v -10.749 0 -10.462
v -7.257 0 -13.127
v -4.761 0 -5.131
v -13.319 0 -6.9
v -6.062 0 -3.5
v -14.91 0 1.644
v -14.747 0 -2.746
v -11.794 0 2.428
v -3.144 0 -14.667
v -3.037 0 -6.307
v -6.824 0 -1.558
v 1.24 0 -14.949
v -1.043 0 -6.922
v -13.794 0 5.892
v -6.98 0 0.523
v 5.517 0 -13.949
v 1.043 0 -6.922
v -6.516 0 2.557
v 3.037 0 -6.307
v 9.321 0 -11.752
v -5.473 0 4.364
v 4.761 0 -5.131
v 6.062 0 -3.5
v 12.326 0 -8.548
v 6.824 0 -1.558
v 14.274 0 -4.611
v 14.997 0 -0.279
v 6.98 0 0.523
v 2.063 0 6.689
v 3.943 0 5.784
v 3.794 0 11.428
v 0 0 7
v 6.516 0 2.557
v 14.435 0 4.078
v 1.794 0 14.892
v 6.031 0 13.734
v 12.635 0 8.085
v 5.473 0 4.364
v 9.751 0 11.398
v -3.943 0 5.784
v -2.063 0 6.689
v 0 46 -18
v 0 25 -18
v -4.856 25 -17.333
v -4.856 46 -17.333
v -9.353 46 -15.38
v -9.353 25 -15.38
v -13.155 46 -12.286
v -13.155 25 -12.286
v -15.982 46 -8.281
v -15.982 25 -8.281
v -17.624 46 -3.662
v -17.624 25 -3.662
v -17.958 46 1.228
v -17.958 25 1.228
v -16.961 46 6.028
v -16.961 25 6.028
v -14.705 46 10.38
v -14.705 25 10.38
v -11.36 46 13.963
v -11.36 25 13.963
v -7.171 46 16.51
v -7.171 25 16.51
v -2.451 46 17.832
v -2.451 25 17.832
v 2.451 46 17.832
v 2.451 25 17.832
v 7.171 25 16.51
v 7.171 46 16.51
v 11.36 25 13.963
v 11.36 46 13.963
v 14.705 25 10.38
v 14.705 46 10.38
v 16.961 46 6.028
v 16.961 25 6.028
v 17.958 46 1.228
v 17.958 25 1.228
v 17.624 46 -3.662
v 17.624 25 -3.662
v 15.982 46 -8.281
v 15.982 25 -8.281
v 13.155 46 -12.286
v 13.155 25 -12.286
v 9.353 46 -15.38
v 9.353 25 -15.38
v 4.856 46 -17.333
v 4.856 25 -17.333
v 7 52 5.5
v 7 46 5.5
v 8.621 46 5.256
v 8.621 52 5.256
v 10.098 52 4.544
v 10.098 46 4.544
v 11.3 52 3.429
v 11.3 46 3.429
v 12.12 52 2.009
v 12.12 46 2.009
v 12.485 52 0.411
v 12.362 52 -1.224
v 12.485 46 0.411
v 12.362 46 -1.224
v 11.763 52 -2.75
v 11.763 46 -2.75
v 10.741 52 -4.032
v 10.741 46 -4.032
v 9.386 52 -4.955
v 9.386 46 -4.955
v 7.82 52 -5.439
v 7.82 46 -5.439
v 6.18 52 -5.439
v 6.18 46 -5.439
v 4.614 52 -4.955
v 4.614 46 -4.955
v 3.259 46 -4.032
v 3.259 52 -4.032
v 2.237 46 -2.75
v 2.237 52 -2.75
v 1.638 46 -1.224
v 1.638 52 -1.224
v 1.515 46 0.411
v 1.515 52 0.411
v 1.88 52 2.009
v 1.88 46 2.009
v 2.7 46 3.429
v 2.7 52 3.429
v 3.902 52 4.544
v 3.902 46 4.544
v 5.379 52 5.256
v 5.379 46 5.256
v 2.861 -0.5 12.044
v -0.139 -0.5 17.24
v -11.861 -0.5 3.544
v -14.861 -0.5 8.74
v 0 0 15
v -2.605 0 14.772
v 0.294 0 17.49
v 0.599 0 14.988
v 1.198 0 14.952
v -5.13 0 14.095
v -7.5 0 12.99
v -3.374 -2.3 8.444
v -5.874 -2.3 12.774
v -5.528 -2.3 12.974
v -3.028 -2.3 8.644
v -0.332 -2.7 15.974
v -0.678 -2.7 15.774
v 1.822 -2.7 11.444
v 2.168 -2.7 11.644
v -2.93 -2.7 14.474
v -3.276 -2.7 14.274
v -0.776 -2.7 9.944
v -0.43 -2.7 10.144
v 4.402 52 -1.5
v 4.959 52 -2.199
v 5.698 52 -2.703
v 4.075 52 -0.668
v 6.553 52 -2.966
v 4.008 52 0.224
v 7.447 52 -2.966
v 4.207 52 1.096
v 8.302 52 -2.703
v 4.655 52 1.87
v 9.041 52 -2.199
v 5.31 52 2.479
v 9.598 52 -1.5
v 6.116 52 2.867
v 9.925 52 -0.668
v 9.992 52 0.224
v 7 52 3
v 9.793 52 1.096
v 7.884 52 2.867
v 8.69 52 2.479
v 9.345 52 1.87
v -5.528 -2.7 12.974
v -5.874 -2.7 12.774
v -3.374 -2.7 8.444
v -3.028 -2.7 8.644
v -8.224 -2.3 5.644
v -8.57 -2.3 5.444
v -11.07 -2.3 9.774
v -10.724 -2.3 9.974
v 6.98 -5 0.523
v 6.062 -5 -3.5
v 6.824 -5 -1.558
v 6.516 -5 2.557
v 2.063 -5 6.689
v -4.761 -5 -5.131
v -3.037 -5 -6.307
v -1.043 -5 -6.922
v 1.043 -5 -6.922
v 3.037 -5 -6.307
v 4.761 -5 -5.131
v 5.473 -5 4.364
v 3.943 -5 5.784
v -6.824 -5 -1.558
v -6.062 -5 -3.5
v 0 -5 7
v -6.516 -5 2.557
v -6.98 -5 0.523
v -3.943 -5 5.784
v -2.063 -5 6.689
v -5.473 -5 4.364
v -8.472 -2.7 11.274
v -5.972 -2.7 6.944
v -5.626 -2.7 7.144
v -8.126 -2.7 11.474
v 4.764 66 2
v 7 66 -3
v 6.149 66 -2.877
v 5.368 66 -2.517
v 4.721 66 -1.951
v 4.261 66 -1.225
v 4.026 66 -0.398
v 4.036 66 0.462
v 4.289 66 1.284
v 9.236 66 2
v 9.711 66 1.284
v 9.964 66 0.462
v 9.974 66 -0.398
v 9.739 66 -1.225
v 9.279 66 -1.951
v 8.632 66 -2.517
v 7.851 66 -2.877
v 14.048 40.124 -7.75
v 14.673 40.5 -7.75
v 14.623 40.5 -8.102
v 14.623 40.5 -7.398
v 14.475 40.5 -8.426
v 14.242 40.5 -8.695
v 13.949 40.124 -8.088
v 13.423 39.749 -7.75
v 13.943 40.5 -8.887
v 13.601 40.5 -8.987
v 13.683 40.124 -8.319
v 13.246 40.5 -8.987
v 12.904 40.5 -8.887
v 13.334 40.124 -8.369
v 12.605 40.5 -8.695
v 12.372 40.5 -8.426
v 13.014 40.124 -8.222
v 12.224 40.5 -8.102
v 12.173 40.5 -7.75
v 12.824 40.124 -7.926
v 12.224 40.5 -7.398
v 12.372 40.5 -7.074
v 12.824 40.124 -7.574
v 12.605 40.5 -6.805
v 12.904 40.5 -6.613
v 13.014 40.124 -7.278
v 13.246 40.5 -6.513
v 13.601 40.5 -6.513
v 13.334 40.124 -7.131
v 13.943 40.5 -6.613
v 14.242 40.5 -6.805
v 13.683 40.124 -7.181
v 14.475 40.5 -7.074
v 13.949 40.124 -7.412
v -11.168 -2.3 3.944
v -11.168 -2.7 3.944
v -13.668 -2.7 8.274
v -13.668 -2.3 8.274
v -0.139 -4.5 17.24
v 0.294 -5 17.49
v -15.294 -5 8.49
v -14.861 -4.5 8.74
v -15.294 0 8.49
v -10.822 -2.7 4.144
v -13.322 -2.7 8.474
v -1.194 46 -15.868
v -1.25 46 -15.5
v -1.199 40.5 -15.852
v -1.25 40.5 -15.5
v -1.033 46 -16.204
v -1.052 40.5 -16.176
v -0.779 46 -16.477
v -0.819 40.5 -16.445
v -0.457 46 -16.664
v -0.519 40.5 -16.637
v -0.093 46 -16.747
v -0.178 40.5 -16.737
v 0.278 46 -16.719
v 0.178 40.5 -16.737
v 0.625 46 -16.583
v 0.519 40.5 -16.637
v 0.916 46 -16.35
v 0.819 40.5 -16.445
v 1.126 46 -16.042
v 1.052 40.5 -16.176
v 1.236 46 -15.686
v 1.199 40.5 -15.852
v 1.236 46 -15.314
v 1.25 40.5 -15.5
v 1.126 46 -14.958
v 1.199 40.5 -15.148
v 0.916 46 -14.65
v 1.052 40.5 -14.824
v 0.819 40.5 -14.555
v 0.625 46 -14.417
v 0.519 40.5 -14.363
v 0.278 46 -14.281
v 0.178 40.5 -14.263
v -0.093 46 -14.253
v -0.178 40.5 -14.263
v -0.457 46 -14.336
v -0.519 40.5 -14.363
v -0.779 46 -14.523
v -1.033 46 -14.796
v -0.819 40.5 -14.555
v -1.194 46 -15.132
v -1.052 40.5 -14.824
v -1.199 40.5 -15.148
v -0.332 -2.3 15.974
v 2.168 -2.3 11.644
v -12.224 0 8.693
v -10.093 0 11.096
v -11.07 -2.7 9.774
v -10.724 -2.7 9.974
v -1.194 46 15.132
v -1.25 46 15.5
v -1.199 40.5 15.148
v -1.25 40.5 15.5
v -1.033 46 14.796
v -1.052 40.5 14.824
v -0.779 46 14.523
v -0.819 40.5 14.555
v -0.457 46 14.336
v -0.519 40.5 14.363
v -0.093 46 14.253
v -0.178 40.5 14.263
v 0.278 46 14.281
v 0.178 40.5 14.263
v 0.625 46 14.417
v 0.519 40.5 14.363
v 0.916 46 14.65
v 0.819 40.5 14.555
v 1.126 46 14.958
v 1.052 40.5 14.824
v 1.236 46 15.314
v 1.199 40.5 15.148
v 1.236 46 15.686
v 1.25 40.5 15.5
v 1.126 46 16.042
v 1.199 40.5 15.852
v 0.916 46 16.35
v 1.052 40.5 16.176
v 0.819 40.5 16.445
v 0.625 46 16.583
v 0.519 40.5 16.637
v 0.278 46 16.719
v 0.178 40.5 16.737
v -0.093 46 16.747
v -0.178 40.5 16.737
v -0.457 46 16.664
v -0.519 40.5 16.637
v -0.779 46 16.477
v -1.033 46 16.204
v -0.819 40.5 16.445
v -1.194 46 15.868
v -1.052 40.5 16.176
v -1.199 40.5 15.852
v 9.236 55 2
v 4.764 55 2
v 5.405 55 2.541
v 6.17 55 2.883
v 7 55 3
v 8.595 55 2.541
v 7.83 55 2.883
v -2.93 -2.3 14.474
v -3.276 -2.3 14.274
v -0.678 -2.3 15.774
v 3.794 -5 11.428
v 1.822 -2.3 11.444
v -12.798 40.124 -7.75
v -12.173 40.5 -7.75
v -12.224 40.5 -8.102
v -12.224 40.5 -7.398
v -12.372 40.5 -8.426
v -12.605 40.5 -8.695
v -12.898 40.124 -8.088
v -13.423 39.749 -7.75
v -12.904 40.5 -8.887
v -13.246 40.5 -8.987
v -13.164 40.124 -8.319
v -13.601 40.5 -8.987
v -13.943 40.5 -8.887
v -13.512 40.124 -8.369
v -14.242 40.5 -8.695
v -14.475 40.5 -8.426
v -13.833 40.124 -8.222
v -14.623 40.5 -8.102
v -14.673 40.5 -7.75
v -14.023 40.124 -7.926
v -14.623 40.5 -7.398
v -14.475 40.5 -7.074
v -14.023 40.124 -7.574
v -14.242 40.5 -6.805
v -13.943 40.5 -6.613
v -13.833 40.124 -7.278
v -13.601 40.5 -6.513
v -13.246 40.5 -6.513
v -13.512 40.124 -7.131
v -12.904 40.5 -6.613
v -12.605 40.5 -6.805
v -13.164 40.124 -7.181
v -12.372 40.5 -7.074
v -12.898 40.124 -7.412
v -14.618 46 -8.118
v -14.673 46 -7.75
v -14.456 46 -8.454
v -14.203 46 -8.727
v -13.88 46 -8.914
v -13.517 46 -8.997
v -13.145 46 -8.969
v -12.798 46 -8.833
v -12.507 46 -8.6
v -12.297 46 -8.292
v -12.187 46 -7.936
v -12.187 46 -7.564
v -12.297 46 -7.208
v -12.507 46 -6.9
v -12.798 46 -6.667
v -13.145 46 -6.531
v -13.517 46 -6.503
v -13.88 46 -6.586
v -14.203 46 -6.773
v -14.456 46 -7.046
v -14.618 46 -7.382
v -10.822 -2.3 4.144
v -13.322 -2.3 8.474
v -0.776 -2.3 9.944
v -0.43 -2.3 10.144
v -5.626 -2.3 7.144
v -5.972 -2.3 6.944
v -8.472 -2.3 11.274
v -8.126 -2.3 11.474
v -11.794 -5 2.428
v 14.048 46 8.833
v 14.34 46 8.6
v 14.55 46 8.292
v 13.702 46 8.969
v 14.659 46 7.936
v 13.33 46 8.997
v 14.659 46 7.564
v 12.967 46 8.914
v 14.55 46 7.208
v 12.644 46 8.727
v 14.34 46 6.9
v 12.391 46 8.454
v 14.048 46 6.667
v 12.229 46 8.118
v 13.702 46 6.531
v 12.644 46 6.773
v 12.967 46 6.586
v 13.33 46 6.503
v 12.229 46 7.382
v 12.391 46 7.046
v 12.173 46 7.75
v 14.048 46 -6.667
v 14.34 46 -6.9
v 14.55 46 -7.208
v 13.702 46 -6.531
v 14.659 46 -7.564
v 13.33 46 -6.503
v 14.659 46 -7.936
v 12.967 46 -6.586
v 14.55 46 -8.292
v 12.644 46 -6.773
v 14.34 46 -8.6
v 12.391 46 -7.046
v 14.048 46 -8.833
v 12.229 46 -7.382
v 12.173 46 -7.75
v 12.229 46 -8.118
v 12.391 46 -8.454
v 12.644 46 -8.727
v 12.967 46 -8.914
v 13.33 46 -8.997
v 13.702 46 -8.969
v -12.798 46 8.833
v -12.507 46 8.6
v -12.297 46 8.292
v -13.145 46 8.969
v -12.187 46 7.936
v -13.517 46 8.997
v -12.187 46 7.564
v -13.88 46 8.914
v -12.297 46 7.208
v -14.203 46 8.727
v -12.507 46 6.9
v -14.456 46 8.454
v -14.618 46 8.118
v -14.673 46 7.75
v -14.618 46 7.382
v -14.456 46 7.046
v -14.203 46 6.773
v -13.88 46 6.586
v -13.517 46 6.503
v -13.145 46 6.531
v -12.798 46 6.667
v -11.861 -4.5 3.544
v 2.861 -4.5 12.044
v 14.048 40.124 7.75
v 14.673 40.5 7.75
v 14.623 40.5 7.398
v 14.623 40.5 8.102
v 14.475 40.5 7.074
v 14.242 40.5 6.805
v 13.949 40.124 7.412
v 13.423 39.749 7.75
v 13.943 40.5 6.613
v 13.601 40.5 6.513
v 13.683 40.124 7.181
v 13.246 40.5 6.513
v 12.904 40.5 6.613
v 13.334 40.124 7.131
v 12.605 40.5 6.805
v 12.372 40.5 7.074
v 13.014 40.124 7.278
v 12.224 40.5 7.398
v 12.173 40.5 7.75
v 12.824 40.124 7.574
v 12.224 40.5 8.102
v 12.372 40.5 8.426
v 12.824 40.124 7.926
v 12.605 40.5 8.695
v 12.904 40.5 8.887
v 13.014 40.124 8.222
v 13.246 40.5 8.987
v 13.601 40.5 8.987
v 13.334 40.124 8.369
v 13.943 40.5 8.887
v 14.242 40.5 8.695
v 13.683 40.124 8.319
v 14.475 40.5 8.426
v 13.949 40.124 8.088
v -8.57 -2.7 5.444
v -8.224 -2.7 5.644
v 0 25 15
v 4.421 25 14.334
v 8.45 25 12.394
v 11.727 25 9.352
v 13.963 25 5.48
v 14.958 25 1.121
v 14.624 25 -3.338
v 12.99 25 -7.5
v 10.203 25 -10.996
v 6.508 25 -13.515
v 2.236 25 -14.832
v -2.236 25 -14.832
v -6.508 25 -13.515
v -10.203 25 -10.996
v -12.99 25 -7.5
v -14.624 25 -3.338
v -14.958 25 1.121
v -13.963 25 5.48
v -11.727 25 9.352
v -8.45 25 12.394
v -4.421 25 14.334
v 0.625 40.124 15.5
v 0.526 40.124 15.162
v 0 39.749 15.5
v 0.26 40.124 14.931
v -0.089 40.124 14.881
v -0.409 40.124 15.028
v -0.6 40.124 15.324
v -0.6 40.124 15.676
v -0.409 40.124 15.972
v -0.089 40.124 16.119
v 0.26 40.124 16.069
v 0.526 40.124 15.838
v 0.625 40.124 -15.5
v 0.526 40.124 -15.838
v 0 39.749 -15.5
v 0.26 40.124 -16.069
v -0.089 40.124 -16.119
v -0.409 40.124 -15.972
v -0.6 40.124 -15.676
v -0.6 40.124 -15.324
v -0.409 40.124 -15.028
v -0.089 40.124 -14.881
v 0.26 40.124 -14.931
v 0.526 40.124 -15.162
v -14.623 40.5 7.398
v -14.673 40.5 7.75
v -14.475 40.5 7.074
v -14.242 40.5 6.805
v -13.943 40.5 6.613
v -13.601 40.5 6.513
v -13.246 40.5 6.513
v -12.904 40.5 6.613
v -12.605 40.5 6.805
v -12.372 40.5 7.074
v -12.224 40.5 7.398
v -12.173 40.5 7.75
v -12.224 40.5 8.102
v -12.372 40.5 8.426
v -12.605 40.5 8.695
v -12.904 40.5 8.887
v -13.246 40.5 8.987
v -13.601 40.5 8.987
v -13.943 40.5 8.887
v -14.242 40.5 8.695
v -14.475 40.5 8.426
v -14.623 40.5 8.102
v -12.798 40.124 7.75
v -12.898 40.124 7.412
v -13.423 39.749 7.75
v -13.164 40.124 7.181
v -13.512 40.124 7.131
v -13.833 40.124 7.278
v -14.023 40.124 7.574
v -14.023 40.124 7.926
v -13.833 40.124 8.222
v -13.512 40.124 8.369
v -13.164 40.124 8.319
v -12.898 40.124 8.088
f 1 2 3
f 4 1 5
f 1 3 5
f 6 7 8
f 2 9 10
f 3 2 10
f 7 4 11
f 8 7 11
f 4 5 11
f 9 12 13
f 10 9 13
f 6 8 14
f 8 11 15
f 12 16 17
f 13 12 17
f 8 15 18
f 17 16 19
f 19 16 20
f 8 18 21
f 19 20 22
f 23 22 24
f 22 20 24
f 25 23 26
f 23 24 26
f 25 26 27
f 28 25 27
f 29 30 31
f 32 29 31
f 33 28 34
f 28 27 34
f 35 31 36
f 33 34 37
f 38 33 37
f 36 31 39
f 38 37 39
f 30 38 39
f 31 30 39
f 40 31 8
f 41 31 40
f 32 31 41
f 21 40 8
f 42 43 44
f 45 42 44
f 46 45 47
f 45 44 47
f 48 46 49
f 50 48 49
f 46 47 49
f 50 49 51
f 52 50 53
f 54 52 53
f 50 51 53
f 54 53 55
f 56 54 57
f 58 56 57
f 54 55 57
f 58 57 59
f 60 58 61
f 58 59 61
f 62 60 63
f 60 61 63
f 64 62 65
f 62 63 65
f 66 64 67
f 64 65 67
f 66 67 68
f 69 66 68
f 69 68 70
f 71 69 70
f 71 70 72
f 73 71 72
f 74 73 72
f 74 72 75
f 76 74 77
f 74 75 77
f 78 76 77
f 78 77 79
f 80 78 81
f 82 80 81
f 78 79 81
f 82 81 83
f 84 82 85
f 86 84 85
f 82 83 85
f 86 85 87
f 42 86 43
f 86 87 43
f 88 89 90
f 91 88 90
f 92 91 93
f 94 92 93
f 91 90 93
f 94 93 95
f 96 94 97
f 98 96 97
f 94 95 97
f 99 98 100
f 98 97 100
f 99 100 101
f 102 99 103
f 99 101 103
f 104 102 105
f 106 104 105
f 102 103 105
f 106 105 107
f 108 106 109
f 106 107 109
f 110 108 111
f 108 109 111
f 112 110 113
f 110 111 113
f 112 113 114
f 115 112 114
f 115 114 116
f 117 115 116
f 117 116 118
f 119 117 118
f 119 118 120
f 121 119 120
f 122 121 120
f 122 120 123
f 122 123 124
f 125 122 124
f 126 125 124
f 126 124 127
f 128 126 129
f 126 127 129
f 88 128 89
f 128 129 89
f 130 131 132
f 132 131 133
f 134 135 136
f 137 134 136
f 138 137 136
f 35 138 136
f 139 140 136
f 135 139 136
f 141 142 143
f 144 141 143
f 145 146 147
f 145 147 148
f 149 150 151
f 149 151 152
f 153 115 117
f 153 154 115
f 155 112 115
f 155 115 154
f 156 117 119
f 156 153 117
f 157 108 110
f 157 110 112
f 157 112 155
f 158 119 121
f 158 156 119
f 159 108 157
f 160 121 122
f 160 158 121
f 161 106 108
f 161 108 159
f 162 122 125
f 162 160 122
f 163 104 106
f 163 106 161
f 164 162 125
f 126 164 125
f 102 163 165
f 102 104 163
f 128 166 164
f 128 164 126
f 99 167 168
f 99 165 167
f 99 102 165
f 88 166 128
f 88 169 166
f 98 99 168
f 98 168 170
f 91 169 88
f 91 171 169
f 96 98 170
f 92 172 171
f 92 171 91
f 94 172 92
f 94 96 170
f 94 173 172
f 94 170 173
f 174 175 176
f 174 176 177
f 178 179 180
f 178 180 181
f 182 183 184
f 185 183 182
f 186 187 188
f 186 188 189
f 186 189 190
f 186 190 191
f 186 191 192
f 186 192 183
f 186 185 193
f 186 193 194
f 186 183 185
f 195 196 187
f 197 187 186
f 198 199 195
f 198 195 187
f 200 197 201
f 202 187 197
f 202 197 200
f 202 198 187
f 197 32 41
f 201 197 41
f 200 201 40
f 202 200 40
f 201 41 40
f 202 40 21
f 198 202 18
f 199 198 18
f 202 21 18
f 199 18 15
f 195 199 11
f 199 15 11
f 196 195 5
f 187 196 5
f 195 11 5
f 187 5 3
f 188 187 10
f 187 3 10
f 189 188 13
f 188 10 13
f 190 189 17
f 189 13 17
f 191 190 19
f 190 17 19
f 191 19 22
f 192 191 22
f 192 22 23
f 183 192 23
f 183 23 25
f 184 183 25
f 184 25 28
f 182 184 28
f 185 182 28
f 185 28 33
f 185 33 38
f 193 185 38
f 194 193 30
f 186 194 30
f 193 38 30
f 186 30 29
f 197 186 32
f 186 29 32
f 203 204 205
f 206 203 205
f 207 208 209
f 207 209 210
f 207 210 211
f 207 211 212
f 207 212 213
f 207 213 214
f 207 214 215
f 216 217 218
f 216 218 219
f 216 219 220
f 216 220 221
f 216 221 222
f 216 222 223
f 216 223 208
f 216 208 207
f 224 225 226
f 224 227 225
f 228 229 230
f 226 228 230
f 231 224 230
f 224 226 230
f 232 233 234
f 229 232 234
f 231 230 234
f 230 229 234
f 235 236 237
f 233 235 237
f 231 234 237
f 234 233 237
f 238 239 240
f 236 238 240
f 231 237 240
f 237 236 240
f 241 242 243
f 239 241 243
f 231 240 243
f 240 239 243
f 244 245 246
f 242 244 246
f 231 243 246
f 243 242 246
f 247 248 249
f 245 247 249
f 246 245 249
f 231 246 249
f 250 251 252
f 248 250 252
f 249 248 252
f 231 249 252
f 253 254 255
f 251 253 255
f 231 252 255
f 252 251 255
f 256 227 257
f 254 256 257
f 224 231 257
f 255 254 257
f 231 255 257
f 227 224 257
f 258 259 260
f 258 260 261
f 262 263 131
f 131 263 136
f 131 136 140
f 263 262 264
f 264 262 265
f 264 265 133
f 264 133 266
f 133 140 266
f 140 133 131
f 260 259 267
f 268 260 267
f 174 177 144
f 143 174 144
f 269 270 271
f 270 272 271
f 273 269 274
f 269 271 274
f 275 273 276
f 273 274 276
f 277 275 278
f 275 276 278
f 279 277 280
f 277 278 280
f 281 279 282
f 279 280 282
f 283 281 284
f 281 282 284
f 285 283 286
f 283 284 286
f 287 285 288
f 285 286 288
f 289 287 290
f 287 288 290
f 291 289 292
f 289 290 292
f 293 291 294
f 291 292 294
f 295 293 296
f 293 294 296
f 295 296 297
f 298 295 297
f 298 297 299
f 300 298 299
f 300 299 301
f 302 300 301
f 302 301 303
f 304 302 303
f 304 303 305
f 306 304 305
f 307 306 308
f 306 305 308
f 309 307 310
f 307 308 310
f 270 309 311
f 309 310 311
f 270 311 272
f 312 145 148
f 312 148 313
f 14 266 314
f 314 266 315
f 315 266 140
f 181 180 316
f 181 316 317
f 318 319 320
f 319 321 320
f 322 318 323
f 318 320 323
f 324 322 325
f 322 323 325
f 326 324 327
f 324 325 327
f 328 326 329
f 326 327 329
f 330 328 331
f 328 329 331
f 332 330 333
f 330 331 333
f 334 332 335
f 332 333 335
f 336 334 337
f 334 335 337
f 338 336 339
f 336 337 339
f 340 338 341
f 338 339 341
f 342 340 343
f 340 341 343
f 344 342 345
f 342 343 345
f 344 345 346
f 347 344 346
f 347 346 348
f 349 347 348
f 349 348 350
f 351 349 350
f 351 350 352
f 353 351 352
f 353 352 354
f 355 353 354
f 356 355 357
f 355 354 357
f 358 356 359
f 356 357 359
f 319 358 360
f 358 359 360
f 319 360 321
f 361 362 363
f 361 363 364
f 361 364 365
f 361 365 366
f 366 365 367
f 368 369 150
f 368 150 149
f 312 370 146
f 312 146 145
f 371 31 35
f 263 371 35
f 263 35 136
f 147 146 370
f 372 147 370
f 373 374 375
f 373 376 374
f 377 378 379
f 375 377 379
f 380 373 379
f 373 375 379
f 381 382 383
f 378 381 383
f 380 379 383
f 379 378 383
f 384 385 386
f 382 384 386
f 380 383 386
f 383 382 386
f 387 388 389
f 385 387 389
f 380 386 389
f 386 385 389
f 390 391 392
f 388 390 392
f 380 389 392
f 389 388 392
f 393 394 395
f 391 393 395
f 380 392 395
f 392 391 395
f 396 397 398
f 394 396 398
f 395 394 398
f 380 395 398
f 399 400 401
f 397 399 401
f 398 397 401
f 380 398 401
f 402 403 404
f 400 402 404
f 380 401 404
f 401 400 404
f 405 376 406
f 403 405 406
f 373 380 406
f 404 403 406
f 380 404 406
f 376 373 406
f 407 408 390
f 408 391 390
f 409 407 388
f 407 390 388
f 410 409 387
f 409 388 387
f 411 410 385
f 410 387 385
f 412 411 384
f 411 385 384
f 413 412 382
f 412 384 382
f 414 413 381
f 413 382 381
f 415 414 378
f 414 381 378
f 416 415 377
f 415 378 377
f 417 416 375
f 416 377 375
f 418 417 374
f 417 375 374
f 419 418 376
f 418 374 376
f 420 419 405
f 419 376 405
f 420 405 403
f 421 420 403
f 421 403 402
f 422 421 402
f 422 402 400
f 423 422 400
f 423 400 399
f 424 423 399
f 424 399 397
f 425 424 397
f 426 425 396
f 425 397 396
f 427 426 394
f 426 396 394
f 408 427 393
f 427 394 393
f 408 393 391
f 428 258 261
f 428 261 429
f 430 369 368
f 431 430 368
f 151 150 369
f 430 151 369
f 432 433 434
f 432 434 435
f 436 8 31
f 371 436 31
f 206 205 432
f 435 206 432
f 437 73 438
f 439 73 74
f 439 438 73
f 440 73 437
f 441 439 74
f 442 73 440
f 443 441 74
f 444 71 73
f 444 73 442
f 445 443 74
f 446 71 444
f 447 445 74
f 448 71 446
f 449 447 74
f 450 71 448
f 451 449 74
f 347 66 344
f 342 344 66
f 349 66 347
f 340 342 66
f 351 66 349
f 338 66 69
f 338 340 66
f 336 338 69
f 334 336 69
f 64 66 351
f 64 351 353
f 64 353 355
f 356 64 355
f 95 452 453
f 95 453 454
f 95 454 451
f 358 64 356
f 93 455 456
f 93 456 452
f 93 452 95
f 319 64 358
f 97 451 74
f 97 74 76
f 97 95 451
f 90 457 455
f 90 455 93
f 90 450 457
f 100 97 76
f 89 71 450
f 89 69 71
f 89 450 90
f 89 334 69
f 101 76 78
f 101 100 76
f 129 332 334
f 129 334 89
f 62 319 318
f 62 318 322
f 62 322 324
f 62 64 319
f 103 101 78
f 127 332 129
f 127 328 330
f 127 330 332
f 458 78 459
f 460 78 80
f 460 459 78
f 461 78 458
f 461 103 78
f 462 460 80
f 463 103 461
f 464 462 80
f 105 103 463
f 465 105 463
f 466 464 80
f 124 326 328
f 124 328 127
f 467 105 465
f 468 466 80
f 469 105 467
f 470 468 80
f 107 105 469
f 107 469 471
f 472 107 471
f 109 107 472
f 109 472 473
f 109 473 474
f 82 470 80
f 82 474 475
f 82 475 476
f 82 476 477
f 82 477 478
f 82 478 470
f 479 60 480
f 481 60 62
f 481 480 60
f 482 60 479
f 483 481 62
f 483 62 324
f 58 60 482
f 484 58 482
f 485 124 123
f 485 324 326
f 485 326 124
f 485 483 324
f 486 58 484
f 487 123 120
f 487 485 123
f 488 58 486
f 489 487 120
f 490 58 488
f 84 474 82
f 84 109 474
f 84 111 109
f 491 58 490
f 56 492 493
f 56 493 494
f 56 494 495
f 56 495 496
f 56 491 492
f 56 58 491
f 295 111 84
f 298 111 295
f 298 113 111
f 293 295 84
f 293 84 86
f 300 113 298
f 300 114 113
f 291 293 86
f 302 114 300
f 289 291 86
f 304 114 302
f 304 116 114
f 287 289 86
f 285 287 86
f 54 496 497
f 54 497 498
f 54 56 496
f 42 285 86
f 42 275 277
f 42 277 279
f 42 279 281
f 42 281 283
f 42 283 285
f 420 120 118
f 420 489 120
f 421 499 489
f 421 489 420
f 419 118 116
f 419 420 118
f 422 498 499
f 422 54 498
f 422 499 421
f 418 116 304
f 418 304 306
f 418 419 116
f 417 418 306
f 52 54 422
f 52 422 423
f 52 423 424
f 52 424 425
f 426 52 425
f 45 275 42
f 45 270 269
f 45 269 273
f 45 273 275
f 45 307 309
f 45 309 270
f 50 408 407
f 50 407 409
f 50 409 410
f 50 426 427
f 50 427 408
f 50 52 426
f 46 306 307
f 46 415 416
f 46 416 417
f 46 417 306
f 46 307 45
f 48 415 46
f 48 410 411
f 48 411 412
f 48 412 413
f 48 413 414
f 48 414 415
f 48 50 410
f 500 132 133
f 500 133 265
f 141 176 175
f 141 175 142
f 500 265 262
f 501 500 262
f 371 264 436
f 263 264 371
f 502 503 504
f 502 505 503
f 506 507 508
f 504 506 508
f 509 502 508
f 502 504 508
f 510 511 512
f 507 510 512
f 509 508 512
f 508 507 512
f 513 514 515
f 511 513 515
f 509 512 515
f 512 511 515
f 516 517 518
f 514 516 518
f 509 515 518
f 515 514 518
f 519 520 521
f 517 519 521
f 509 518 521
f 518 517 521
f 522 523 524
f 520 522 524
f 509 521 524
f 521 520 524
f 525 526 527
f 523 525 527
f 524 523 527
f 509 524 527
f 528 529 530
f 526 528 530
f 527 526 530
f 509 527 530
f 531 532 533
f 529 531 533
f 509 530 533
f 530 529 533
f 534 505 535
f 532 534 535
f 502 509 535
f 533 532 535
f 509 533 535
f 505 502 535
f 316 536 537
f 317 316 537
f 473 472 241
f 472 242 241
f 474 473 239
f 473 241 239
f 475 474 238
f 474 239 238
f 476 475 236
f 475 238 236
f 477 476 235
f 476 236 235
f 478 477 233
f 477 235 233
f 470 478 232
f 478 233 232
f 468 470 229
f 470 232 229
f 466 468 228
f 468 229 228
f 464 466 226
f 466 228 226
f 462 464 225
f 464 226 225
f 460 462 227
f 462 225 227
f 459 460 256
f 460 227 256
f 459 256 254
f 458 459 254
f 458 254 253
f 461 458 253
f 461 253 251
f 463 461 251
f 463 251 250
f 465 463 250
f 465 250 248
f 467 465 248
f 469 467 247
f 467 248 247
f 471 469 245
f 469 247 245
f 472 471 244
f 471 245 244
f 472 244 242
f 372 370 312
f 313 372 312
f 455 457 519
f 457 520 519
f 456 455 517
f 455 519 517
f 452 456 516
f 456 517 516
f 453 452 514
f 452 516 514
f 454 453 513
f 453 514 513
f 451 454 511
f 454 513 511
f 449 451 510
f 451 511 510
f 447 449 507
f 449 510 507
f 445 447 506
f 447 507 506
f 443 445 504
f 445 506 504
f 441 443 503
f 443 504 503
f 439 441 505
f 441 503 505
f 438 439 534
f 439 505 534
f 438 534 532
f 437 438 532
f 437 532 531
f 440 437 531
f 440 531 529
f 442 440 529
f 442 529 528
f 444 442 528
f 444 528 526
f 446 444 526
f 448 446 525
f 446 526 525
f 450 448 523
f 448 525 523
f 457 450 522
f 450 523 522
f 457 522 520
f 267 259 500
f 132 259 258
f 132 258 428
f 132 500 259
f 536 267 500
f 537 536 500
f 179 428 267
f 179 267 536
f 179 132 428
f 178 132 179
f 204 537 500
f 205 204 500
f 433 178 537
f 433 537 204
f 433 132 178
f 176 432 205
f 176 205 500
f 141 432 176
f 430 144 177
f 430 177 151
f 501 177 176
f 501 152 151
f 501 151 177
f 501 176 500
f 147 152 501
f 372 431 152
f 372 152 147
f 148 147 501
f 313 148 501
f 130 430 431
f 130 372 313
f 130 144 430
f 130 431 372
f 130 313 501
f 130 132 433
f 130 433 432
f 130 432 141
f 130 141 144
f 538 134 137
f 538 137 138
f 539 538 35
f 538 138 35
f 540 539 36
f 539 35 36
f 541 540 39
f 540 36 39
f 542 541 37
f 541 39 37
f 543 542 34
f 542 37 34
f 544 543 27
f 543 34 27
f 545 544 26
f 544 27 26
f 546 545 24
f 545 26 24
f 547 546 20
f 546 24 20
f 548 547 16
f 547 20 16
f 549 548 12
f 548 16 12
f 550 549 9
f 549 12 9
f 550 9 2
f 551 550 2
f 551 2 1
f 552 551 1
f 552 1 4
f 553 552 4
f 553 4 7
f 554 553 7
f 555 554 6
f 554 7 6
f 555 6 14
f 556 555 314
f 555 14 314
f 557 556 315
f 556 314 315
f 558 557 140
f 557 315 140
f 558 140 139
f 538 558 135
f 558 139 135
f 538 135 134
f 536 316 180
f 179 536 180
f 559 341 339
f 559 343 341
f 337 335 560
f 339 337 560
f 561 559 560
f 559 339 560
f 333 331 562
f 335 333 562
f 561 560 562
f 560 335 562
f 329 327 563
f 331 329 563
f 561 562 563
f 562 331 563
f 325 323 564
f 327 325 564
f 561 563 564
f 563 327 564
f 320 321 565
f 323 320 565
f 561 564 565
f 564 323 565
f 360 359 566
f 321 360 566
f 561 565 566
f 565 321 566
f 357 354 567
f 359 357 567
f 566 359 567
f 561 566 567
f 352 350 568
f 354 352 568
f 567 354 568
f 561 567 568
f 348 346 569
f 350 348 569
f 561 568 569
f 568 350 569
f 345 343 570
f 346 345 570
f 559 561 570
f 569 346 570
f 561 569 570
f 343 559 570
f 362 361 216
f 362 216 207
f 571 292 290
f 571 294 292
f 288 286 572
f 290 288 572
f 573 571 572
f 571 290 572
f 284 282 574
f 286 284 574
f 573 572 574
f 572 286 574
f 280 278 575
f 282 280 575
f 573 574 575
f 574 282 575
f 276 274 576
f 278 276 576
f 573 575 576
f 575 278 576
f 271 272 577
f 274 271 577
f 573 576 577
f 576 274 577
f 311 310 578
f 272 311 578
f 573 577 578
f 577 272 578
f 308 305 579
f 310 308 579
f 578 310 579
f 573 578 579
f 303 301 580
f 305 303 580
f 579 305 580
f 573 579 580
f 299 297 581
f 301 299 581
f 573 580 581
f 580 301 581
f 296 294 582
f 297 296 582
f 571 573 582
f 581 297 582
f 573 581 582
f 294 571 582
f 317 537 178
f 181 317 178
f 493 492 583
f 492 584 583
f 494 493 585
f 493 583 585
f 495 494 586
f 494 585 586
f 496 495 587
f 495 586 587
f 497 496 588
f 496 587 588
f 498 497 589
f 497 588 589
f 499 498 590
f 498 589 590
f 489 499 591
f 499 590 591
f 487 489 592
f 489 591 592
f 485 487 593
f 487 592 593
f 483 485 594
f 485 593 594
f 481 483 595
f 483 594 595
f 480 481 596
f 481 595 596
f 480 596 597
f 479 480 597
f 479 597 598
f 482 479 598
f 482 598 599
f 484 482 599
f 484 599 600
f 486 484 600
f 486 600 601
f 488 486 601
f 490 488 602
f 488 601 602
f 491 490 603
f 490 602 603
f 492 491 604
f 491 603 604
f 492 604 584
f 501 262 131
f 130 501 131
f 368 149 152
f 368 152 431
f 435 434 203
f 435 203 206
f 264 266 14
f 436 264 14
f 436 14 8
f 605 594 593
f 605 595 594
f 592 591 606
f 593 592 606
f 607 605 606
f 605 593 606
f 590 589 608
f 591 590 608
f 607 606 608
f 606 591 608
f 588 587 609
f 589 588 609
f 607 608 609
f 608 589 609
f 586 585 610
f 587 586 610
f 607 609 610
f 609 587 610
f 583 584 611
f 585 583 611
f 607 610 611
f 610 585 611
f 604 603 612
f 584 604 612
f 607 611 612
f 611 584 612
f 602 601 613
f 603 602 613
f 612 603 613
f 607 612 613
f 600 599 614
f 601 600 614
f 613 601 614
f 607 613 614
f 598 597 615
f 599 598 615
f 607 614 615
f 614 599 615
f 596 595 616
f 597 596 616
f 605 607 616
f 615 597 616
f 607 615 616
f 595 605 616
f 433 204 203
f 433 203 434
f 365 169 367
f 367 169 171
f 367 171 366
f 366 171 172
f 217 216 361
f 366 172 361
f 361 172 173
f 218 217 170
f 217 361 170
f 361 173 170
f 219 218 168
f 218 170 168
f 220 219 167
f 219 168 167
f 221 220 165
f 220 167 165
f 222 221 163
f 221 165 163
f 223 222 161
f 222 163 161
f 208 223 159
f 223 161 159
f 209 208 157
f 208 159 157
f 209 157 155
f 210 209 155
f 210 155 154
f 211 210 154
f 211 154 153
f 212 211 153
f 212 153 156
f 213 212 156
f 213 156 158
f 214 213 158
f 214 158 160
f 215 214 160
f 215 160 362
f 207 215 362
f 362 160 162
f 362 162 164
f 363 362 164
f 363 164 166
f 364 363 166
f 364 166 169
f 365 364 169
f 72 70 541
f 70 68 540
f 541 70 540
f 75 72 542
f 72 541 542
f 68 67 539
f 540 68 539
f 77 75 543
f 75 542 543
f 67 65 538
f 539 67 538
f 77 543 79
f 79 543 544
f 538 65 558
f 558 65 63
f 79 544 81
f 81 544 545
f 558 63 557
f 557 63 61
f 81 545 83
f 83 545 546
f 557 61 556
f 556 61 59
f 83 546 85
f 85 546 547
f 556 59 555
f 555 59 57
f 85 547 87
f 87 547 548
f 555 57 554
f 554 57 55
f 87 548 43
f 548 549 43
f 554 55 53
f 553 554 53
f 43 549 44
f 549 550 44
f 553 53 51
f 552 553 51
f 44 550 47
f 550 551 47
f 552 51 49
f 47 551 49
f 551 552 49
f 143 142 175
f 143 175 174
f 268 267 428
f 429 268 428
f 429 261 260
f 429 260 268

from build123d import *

# Parameters (mm, degrees)
SKETCH_1_R             = 15
EXTRUDE_1_DEPTH        = 25
SKETCH_2_R             = 18
EXTRUDE_2_DEPTH        = 21
SKETCH_3_R             = 5.5
EXTRUDE_3_DEPTH        = 6
SKETCH_4_R             = 3
EXTRUDE_4_DEPTH        = 14
CUT_EXTRUDE_START      = -11
CUT_EXTRUDE_1_DEPTH    = 11
HOLE_WIZARD_M3_1_D     = 2.5
HOLE_WIZARD_M3_1_DEPTH = 5.5
HOLE_WIZARD_M3_1_TIP   = 0.751075774
EXTRUDE_5_DEPTH        = 5
SKETCH_10_R            = 7
EXTRUDE_6_DEPTH        = 5
CUT_EXTRUDE_2_DEPTH    = 6
SKETCH_12_W            = 0.4
SKETCH_12_H            = 0.4
EXTRUDE_7_DEPTH        = 5


with BuildPart() as part:
    # 草图1 → 凸台-拉伸1 (new body)
    with BuildSketch(Plane(origin=(0, 0, 0), x_dir=(1, 0, 0), z_dir=(0, 1, 0))):
        with Locations(Location((0, 0, 0), (0, 0, 270))):
            Circle(SKETCH_1_R)
    extrude(amount=EXTRUDE_1_DEPTH)

    # 草图2 → 凸台-拉伸2 (add)
    with BuildSketch(Plane(origin=(0, 25, 0), x_dir=(1, 0, 0), z_dir=(0, 1, 0))):
        with Locations(Location((0, 0, 0), (0, 0, 90))):
            Circle(SKETCH_2_R)
    extrude(amount=EXTRUDE_2_DEPTH)

    # 草图3 → 凸台-拉伸3 (add)
    with BuildSketch(Plane(origin=(0, 46, 0), x_dir=(1, 0, 0), z_dir=(0, 1, 0))):
        with Locations(Location((7, 0, 0), (0, 0, 270))):
            Circle(SKETCH_3_R)
    extrude(amount=EXTRUDE_3_DEPTH)

    # 草图4 → 凸台-拉伸4 (add)
    with BuildSketch(Plane(origin=(0, 52, 0), x_dir=(1, 0, 0), z_dir=(0, 1, 0))):
        with Locations(Location((7, 0, 0), (0, 0, 270))):
            Circle(SKETCH_4_R)
    extrude(amount=EXTRUDE_4_DEPTH)

    # 草图5 → 切除-拉伸1 (cut)
    with BuildSketch(Plane(origin=(0, 66, 0), x_dir=(1, 0, 0), z_dir=(0, 1, 0)).offset(CUT_EXTRUDE_START)):
        with BuildLine():
            Line((9.236067977, -2), (4.763932023, -2))
            ThreePointArc((4.763932023, -2), (7, -3), (9.236067977, -2))
        make_face()
    extrude(amount=CUT_EXTRUDE_1_DEPTH, mode=Mode.SUBTRACT)

    # M3 螺纹孔1
    with Locations(Plane(origin=(0, 46, 0), x_dir=(1, 0, 0), z_dir=(0, 1, 0))):
        with Locations((0, 15.5), (-13.423393759, 7.75), (-13.423393759, -7.75), (0, -15.5), (13.423393759, -7.75), (13.423393759, 7.75)):
            Hole(HOLE_WIZARD_M3_1_D / 2, depth=HOLE_WIZARD_M3_1_DEPTH)
            with Locations((0, 0, -(HOLE_WIZARD_M3_1_DEPTH + HOLE_WIZARD_M3_1_TIP / 2))):  # 118° drill point
                Cone(0, HOLE_WIZARD_M3_1_D / 2, HOLE_WIZARD_M3_1_TIP, mode=Mode.SUBTRACT)

    # 草图9 → 凸台-拉伸5 (add)
    with BuildSketch(Plane.XZ):
        Polygon((-15.294228634, 8.490381057), (-11.794228634, 2.42820323), (3.794228634, 11.42820323), (0.294228634, 17.490381057), align=None)
    extrude(amount=EXTRUDE_5_DEPTH)

    # 草图10 → 凸台-拉伸6 (add)
    with BuildSketch(Plane.XZ):
        with Locations(Location((0, 0, 0), (0, 0, 90))):
            Circle(SKETCH_10_R)
    extrude(amount=EXTRUDE_6_DEPTH)

    # 草图11 → 切除-拉伸2 (cut)
    with BuildSketch(Plane(origin=(-7.5, 0, 12.990381057), x_dir=(0.8660254037844379, 0, 0.5000000000000013), z_dir=(-0.5000000000000013, 0, 0.8660254037844379))):
        Polygon((8.5, -0.5), (0, -0.5), (-8.5, -0.5), (-8.5, -4.5), (8.5, -4.5), align=None)
    extrude(amount=-CUT_EXTRUDE_2_DEPTH, mode=Mode.SUBTRACT)

    # 草图12 → 凸台-拉伸7 (add)
    with BuildSketch(Plane(origin=(-4.5, 0, 7.794228634), x_dir=(0.8660254037844379, 0, 0.5000000000000013), z_dir=(-0.5000000000000013, 0, 0.8660254037844379))):
        with Locations((-7.5, -2.5)):
            Rectangle(SKETCH_12_W, SKETCH_12_H)
        with Locations((-4.5, -2.5)):
            Rectangle(SKETCH_12_W, SKETCH_12_H)
        with Locations((-1.5, -2.5)):
            Rectangle(SKETCH_12_W, SKETCH_12_H)
        with Locations((1.5, -2.5)):
            Rectangle(SKETCH_12_W, SKETCH_12_H)
        with Locations((4.5, -2.5)):
            Rectangle(SKETCH_12_W, SKETCH_12_H)
        with Locations((7.5, -2.5)):
            Rectangle(SKETCH_12_W, SKETCH_12_H)
    extrude(amount=EXTRUDE_7_DEPTH)


solid = part.part
